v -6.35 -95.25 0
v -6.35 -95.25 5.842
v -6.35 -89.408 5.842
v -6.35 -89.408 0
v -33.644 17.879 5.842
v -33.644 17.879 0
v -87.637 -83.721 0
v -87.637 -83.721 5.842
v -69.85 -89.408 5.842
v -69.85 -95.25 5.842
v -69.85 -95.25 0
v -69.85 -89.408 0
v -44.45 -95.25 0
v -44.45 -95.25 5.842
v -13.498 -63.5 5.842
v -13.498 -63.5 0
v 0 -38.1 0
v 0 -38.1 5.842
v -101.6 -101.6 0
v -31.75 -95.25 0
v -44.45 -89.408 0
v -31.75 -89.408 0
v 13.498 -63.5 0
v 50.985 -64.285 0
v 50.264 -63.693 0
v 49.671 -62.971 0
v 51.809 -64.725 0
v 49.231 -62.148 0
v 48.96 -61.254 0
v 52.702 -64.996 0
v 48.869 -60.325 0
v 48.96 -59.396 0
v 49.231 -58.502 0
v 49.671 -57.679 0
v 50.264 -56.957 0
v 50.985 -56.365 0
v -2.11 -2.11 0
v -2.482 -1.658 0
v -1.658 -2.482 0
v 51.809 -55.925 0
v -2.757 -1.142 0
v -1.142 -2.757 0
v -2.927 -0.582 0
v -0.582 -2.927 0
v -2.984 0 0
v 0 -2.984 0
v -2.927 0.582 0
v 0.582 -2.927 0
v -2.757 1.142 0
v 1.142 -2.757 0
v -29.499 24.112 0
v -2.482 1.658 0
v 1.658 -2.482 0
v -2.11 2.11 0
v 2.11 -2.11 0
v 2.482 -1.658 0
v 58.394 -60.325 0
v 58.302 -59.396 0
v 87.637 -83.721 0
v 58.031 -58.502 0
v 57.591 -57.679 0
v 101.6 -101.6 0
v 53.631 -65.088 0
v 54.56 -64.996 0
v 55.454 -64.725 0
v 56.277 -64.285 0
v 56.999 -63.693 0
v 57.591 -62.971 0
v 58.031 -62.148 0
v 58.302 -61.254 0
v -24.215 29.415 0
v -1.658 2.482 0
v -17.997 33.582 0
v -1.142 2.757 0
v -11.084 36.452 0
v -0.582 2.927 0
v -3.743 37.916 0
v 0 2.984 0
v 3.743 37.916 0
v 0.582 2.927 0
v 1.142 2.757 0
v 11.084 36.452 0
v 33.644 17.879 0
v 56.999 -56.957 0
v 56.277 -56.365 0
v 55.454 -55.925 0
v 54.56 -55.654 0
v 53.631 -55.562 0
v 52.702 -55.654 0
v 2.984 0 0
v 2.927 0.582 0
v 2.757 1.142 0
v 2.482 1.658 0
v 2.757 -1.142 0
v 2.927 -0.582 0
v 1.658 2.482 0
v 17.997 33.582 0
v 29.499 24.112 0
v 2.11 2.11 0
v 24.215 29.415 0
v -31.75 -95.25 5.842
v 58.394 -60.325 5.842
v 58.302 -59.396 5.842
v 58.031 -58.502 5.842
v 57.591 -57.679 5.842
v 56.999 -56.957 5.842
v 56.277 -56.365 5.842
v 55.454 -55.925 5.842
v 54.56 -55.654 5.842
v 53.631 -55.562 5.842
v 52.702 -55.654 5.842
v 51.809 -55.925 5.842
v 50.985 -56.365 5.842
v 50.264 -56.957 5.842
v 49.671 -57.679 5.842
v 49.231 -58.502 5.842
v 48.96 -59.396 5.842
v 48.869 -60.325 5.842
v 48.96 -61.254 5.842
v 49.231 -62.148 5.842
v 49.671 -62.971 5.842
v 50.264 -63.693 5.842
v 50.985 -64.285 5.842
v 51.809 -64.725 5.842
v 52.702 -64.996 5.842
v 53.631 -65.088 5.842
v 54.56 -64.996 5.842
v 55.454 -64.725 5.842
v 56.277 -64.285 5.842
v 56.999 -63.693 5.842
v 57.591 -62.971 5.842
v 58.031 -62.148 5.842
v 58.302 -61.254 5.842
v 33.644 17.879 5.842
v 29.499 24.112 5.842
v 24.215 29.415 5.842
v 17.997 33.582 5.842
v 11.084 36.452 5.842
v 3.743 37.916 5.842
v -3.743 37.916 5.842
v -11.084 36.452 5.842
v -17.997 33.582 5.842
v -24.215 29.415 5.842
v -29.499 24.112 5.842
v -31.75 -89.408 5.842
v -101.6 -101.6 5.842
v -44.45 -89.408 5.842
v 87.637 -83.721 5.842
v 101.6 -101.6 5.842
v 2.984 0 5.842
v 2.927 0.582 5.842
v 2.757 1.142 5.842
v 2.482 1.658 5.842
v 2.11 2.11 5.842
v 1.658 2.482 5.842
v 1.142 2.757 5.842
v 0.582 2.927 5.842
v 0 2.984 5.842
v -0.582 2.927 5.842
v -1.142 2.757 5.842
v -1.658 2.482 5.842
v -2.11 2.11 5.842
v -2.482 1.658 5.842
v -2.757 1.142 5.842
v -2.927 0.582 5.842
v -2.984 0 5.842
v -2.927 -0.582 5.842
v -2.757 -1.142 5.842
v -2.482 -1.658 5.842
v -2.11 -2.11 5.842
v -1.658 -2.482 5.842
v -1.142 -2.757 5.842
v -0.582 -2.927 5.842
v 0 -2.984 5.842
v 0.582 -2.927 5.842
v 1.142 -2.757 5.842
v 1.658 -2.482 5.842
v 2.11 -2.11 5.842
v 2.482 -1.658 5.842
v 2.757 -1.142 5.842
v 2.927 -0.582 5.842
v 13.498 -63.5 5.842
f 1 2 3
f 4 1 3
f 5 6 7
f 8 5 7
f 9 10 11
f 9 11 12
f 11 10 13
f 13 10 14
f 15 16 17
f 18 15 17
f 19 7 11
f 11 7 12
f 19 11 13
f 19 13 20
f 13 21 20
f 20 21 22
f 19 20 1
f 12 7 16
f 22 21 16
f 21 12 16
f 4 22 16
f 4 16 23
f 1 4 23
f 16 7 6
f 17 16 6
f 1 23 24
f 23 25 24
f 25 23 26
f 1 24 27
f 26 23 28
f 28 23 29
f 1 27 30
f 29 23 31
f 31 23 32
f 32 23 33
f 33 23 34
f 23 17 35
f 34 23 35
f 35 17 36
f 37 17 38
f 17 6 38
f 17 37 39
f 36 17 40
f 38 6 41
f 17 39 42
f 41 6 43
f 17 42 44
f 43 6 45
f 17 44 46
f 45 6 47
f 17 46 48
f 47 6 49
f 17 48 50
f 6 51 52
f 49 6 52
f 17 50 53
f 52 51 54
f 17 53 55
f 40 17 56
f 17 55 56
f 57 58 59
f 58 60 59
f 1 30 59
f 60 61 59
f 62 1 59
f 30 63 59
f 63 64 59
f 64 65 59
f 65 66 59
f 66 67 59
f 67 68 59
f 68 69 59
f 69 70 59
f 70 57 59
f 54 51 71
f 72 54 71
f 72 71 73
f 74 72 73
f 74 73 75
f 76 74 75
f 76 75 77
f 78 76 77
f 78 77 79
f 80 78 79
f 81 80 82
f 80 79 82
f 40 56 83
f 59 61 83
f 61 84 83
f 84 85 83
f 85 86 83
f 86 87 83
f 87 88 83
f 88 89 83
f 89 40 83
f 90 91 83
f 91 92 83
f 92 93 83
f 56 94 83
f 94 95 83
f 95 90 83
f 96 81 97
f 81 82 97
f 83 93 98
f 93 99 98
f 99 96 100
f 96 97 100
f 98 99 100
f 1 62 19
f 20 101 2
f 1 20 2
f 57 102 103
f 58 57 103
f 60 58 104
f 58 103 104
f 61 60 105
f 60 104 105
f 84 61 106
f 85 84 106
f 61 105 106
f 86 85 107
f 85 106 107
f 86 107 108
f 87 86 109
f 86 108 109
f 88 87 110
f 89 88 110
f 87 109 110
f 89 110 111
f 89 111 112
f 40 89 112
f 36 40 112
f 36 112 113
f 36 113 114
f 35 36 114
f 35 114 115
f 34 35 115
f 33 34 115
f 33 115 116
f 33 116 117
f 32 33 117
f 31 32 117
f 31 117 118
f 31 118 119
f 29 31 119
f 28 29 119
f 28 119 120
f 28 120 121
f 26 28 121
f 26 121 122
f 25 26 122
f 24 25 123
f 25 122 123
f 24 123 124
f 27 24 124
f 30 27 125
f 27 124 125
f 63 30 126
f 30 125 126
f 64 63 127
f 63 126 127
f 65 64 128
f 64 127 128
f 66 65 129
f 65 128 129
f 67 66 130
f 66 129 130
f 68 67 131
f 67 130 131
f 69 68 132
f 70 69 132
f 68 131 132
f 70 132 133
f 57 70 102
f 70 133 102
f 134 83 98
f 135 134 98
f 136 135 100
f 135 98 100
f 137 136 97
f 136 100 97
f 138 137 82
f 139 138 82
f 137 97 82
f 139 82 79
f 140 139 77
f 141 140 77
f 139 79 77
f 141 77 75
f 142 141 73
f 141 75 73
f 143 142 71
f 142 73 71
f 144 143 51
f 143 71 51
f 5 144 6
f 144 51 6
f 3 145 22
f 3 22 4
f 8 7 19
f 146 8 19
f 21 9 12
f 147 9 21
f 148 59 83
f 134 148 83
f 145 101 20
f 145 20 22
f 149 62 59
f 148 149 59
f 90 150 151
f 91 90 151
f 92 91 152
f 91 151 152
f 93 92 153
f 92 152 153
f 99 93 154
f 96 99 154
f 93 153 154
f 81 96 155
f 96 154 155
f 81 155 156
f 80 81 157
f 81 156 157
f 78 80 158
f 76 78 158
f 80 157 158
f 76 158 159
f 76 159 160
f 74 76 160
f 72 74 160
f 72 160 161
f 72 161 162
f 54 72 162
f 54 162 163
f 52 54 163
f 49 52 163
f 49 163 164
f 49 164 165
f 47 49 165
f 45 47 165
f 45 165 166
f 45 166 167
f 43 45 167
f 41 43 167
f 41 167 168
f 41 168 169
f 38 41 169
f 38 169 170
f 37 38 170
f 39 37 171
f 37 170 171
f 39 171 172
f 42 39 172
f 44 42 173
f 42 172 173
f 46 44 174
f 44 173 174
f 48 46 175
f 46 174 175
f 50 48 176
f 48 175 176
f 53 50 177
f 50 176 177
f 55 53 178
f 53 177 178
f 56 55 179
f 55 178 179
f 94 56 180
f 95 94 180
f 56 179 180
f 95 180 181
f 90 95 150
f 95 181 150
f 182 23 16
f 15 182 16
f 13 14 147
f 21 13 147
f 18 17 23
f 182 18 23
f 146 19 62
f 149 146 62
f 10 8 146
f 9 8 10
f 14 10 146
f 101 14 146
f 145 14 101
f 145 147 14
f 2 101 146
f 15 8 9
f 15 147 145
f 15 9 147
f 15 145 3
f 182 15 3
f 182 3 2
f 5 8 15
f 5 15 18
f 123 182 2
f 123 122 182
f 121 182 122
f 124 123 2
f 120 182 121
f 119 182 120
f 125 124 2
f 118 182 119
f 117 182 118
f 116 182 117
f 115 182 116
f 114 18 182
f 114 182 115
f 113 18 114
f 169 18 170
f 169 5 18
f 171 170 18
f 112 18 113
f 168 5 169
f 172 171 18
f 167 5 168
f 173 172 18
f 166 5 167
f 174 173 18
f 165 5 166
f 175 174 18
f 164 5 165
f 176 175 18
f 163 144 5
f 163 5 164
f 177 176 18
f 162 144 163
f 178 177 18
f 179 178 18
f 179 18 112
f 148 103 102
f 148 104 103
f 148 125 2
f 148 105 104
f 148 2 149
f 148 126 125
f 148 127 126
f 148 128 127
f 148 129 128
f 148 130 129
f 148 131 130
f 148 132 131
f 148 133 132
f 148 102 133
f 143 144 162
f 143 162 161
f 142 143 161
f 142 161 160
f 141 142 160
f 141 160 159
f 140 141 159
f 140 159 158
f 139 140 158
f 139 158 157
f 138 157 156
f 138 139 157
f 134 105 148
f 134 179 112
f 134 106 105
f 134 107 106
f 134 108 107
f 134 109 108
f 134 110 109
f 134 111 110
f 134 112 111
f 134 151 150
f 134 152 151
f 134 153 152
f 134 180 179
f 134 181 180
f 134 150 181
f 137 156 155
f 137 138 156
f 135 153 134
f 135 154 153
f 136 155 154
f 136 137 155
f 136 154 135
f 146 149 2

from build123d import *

# Parameters (mm, degrees)
F1_DEPTH = 5.842
F2_R     = 2.9845
F2_R_2   = 4.7625
F3_DEPTH = 25.4
F4_W     = 25.4
F4_H     = 5.842
F5_DEPTH = 25.4


with BuildPart() as f1:
    # F0 (on Top) → F1 (new body)
    with BuildSketch(Plane.XY):
        with BuildLine():
            ThreePointArc((0, -38.1), (26.940768, -26.940768), (38.1, 0))
            ThreePointArc((38.1, 0), (36.969278, 9.21317), (33.644225, 17.879489))
            ThreePointArc((33.644225, 17.879489), (0, 38.1), (-33.644225, 17.879489))
            ThreePointArc((-33.644225, 17.879489), (-32.655922, -19.626532), (0, -38.1))
        make_face()
        with BuildLine():
            ThreePointArc((33.644225, 17.879489), (36.969278, 9.21317), (38.1, 0))
            ThreePointArc((38.1, 0), (26.940768, -26.940768), (0, -38.1))
            ThreePointArc((0, -38.1), (-32.655922, -19.626532), (-33.644225, 17.879489))
            Line((-33.644225, 17.879489), (-87.637326, -83.720511))
            Line((-87.637326, -83.720511), (-101.6, -101.6))
            Line((-101.6, -101.6), (-53.993101, -101.6))
            Line((-53.993101, -101.6), (53.993101, -101.6))
            Line((53.993101, -101.6), (101.6, -101.6))
            Line((101.6, -101.6), (87.637326, -83.720511))
            Line((87.637326, -83.720511), (33.644225, 17.879489))
        make_face()
        Polygon((-13.498275, -63.5), (0, -38.1), (13.498275, -63.5), (22.416117, -80.280898), (-22.416117, -80.280898), align=None, mode=Mode.SUBTRACT)
        Polygon((13.498275, -63.5), (-13.498275, -63.5), (-22.416117, -80.280898), (22.416117, -80.280898), align=None)
    extrude(amount=F1_DEPTH)

    # F2 (on face) → F3 (cut)
    with BuildSketch(Plane.XY.offset(5.842)):
        Circle(F2_R)
        with Locations((53.631348, -60.325)):
            Circle(F2_R_2)
    extrude(amount=-F3_DEPTH, mode=Mode.SUBTRACT)

    # F4 (on face) → F5 (cut)
    with BuildSketch(Plane.XY.offset(5.842)):
        with Locations((-57.15, -92.329)):
            Rectangle(F4_W, F4_H)
        with Locations((-19.05, -92.329)):
            Rectangle(F4_W, F4_H)
    extrude(amount=-F5_DEPTH, mode=Mode.SUBTRACT)


solid = f1.part
